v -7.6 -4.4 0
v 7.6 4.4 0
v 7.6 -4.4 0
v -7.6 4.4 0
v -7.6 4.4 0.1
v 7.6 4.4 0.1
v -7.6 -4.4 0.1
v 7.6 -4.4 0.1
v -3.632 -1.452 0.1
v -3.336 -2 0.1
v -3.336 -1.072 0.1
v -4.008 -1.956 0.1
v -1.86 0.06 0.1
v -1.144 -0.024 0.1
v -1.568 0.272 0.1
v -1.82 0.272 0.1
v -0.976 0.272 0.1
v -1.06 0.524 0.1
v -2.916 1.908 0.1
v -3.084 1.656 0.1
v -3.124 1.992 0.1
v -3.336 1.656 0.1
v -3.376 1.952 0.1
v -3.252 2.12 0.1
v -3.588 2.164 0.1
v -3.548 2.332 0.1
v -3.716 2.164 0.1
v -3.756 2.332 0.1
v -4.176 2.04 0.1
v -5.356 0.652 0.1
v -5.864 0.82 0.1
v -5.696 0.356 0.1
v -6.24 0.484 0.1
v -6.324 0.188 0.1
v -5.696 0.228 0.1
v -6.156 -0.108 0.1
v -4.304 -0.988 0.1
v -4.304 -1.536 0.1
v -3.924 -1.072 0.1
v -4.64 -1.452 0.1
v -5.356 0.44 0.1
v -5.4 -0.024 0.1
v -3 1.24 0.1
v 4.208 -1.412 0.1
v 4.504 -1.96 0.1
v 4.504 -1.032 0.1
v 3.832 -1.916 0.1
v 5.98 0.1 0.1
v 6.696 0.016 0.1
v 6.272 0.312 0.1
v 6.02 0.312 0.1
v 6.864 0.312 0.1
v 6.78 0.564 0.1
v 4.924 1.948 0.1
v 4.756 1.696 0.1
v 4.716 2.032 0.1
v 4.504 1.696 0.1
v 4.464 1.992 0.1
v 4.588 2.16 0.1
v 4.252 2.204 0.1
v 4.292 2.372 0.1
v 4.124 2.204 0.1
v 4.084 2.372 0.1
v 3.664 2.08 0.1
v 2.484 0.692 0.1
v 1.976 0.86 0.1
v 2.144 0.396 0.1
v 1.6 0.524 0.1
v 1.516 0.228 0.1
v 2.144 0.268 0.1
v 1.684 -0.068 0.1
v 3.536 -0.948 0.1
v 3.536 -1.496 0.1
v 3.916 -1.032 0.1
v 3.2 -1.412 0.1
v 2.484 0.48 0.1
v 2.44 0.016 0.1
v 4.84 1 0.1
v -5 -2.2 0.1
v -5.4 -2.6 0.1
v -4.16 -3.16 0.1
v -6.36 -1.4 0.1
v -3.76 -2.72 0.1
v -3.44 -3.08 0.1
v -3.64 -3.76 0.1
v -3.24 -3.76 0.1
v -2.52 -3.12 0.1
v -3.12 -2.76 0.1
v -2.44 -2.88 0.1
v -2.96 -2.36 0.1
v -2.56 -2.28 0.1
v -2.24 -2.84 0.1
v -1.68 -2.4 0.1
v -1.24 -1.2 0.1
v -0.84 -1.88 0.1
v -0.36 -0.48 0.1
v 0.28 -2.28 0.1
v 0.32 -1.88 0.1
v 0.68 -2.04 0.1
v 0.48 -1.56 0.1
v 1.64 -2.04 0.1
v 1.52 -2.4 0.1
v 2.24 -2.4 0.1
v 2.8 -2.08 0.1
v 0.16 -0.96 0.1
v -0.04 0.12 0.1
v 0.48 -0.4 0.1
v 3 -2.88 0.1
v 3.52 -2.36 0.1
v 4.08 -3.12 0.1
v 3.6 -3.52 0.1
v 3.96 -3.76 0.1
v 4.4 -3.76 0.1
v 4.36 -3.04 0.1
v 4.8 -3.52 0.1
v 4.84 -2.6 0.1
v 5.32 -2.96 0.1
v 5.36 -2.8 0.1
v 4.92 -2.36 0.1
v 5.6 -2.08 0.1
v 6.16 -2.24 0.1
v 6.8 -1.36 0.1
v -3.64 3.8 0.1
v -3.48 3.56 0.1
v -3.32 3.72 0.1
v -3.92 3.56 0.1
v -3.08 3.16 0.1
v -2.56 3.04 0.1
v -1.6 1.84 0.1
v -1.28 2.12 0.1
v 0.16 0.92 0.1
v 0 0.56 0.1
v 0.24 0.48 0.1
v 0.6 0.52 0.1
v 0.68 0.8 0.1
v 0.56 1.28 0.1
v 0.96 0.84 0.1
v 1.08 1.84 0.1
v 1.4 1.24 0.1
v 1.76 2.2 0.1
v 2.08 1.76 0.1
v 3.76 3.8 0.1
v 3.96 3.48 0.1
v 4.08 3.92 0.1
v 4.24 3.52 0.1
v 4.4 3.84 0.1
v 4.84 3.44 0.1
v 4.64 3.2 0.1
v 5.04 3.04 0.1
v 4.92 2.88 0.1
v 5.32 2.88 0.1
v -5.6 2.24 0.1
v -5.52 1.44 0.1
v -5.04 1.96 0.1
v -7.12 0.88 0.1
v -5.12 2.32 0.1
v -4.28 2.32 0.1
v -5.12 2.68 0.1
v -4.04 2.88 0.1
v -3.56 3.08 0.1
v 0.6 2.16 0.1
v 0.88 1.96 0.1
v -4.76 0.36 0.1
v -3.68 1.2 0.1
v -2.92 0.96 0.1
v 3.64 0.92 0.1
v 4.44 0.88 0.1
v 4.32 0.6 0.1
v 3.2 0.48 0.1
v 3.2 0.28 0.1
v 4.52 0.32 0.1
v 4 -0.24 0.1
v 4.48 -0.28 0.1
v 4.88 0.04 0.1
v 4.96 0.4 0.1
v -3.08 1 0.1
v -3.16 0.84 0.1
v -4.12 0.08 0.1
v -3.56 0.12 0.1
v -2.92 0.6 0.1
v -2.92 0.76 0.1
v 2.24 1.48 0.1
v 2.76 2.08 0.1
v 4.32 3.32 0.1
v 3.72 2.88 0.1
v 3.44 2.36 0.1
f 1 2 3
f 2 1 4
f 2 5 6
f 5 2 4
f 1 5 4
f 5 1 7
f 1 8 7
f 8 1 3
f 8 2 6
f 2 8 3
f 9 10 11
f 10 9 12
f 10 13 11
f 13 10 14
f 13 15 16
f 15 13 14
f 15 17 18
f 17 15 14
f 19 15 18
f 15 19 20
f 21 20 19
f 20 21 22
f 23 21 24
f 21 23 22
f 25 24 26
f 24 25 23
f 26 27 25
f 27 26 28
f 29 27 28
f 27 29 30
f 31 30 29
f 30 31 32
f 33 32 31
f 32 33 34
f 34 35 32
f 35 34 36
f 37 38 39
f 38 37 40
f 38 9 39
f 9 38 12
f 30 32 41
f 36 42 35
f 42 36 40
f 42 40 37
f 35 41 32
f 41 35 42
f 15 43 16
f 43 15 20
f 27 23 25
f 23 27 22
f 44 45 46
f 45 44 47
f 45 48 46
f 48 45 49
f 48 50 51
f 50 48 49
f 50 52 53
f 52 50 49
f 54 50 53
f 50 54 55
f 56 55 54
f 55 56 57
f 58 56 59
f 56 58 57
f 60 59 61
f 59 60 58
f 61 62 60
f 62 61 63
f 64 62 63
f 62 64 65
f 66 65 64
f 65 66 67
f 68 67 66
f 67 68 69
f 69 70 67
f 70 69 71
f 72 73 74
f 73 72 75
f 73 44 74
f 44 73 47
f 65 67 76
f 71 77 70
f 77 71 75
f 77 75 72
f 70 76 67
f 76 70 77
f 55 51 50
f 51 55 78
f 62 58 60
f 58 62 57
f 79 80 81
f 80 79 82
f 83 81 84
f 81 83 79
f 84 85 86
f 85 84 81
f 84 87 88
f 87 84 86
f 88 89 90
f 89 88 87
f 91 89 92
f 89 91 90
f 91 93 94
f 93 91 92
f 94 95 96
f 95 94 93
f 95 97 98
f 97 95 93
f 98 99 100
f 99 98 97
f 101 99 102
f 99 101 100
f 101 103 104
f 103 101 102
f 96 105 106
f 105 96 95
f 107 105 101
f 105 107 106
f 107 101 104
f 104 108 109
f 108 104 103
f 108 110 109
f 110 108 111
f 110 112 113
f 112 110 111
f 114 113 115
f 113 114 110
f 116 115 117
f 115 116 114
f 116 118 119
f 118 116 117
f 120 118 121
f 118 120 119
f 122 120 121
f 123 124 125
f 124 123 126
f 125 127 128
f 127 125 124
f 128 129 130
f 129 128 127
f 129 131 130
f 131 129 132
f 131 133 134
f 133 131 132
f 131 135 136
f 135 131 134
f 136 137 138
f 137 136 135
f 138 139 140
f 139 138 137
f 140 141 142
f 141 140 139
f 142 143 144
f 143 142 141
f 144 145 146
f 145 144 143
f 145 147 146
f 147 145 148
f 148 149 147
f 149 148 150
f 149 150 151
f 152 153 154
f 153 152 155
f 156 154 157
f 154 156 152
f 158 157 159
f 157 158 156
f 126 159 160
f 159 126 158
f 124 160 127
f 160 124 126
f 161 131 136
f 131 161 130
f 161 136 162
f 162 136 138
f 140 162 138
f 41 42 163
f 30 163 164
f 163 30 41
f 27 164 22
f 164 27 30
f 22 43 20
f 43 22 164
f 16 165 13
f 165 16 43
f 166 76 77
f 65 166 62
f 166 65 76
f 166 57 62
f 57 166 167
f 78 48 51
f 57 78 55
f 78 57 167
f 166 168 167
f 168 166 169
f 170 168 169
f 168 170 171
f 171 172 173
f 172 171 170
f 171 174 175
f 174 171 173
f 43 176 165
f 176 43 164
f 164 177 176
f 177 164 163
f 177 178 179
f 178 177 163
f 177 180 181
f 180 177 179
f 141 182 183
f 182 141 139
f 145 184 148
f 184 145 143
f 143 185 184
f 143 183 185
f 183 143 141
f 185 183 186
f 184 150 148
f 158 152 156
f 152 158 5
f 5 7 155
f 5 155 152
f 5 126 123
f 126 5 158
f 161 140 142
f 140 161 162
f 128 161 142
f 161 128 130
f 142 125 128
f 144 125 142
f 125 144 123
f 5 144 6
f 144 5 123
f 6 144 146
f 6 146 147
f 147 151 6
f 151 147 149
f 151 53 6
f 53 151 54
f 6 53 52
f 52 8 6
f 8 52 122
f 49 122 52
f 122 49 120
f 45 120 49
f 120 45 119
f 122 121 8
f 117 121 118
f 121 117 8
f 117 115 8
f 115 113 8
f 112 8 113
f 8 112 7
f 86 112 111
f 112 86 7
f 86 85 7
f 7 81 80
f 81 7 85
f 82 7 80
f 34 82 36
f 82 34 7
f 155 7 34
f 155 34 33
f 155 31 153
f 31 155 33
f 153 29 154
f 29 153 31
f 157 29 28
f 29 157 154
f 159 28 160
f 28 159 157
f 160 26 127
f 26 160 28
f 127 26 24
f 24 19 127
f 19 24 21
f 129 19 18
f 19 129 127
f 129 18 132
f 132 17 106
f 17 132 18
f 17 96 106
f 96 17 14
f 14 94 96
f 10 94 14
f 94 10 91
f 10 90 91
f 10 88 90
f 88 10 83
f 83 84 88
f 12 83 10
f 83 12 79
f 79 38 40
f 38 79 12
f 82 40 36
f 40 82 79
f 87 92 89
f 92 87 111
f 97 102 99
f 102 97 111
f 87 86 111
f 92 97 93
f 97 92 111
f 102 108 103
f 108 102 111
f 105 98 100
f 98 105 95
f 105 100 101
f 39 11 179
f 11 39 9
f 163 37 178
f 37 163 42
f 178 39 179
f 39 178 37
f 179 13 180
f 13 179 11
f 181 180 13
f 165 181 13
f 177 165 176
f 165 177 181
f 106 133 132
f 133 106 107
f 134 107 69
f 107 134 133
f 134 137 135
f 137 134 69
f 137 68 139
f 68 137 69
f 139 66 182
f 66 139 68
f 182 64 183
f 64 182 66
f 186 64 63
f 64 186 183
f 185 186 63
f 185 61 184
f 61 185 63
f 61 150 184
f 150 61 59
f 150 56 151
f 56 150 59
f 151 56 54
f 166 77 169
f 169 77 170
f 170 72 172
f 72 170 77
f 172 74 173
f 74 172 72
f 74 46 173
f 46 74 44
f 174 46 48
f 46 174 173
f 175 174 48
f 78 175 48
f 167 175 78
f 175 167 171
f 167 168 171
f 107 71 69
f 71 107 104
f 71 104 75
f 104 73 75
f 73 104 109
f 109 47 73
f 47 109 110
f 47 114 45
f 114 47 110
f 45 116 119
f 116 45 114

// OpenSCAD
// file: ../p/box5-12.scad
use <../lib.scad>
function ldraw_lib__box5_12() = [
// 0 Box with 5 Faces without Any Edges
// 0 Name: box5-12.dat
// 0 Author: Chris Dee [cwdee]
// 0 !LDRAW_ORG Primitive UPDATE 2009-02
// 0 !LICENSE Licensed under CC BY 2.0 and CC BY 4.0 : see CAreadme.txt
// 
// 0 BFC CERTIFY CCW
  [0,"BFC","CERTIFY"],
  [0,"BFC","CCW"],
// 
// 0 !HISTORY 2009-09-03 [PTadmin] Official Update 2009-02
// 
// 
// 4 16 1 1 1 1 1 -1 -1 1 -1 -1 1 1
  [4,16,1,1,1,1,1,-1,-1,1,-1,-1,1,1],
// 4 16 -1 0 1 1 0 1 1 1 1 -1 1 1
  [4,16,-1,0,1,1,0,1,1,1,1,-1,1,1],
// 4 16 -1 0 -1 -1 0 1 -1 1 1 -1 1 -1
  [4,16,-1,0,-1,-1,0,1,-1,1,1,-1,1,-1],
// 4 16 1 0 -1 -1 0 -1 -1 1 -1 1 1 -1
  [4,16,1,0,-1,-1,0,-1,-1,1,-1,1,1,-1],
// 4 16 1 0 1 1 0 -1 1 1 -1 1 1 1
  [4,16,1,0,1,1,0,-1,1,1,-1,1,1,1],
// 0
];
makepoly(ldraw_lib__box5_12(), line=0.2);
// main file
use <../lib.scad>
use <../p/box5-12.scad>
function ldraw_lib__6005724h1() = [
// 0 Sticker  1.1 x  1.9 with Diamond Bricks Type 1
// 0 Name: 6005724h1.dat
// 0 Author: Christian Neumann [Wesley]
// 0 !LDRAW_ORG Part UPDATE 2014-02
// 0 !LICENSE Licensed under CC BY 2.0 and CC BY 4.0 : see CAreadme.txt
// 
// 0 BFC CERTIFY CCW
  [0,"BFC","CERTIFY"],
  [0,"BFC","CCW"],
// 
// 0 !KEYWORDS Lord of the Rings, LOTR, Mines of Moria, Set 9473
// 
// 0 !CMDLINE -c72
// 
// 0 !HISTORY 2014-12-23 [PTadmin] Official Update 2014-02
// 
// 
// 1 16 0 -0.25 0 19 0 0 0 0.25 0 0 0 11 box5-12.dat
  [1,16,0,-0.25,0,19,0,0,0,0.25,0,0,0,11, ldraw_lib__box5_12()],
// 4 0 -9.08 -0.25 -3.63 -10.02 -0.25 -4.89 -8.34 -0.25 -5 -8.34 -0.25 -2.68
  [4,0,-9.08,-0.25,-3.63,-10.02,-0.25,-4.89,-8.34,-0.25,-5,-8.34,-0.25,-2.68],
// 4 0 -4.65 -0.25 0.15 -8.34 -0.25 -2.68 -8.34 -0.25 -5 -2.86 -0.25 -0.06
  [4,0,-4.65,-0.25,0.15,-8.34,-0.25,-2.68,-8.34,-0.25,-5,-2.86,-0.25,-0.06],
// 4 0 -4.55 -0.25 0.68 -4.65 -0.25 0.15 -2.86 -0.25 -0.06 -3.92 -0.25 0.68
  [4,0,-4.55,-0.25,0.68,-4.65,-0.25,0.15,-2.86,-0.25,-0.06,-3.92,-0.25,0.68],
// 4 0 -3.92 -0.25 0.68 -2.86 -0.25 -0.06 -2.44 -0.25 0.68 -2.65 -0.25 1.31
  [4,0,-3.92,-0.25,0.68,-2.86,-0.25,-0.06,-2.44,-0.25,0.68,-2.65,-0.25,1.31],
// 4 0 -3.92 -0.25 0.68 -2.65 -0.25 1.31 -7.29 -0.25 4.77 -7.71 -0.25 4.14
  [4,0,-3.92,-0.25,0.68,-2.65,-0.25,1.31,-7.29,-0.25,4.77,-7.71,-0.25,4.14],
// 4 0 -7.71 -0.25 4.14 -7.29 -0.25 4.77 -7.81 -0.25 4.98 -8.34 -0.25 4.14
  [4,0,-7.71,-0.25,4.14,-7.29,-0.25,4.77,-7.81,-0.25,4.98,-8.34,-0.25,4.14],
// 4 0 -8.44 -0.25 4.88 -8.34 -0.25 4.14 -7.81 -0.25 4.98 -8.13 -0.25 5.3
  [4,0,-8.44,-0.25,4.88,-8.34,-0.25,4.14,-7.81,-0.25,4.98,-8.13,-0.25,5.3],
// 4 0 -8.97 -0.25 5.41 -8.44 -0.25 4.88 -8.13 -0.25 5.3 -8.87 -0.25 5.83
  [4,0,-8.97,-0.25,5.41,-8.44,-0.25,4.88,-8.13,-0.25,5.3,-8.87,-0.25,5.83],
// 4 0 -8.97 -0.25 5.41 -8.87 -0.25 5.83 -9.39 -0.25 5.83 -9.29 -0.25 5.41
  [4,0,-8.97,-0.25,5.41,-8.87,-0.25,5.83,-9.39,-0.25,5.83,-9.29,-0.25,5.41],
// 4 0 -9.29 -0.25 5.41 -9.39 -0.25 5.83 -10.44 -0.25 5.1 -13.39 -0.25 1.63
  [4,0,-9.29,-0.25,5.41,-9.39,-0.25,5.83,-10.44,-0.25,5.1,-13.39,-0.25,1.63],
// 4 0 -13.39 -0.25 1.63 -10.44 -0.25 5.1 -14.66 -0.25 2.05 -14.24 -0.25 0.89
  [4,0,-13.39,-0.25,1.63,-10.44,-0.25,5.1,-14.66,-0.25,2.05,-14.24,-0.25,0.89],
// 4 0 -14.24 -0.25 0.89 -14.66 -0.25 2.05 -15.6 -0.25 1.21 -15.81 -0.25 0.47
  [4,0,-14.24,-0.25,0.89,-14.66,-0.25,2.05,-15.6,-0.25,1.21,-15.81,-0.25,0.47],
// 4 0 -14.24 -0.25 0.57 -14.24 -0.25 0.89 -15.81 -0.25 0.47 -15.39 -0.25 -0.27
  [4,0,-14.24,-0.25,0.57,-14.24,-0.25,0.89,-15.81,-0.25,0.47,-15.39,-0.25,-0.27],
// 4 0 -10.76 -0.25 -2.47 -11.6 -0.25 -3.63 -10.76 -0.25 -3.84 -9.81 -0.25 -2.68
  [4,0,-10.76,-0.25,-2.47,-11.6,-0.25,-3.63,-10.76,-0.25,-3.84,-9.81,-0.25,-2.68],
// 4 0 -9.81 -0.25 -2.68 -10.76 -0.25 -3.84 -10.02 -0.25 -4.89 -9.08 -0.25 -3.63
  [4,0,-9.81,-0.25,-2.68,-10.76,-0.25,-3.84,-10.02,-0.25,-4.89,-9.08,-0.25,-3.63],
// 3 0 -13.39 -0.25 1.63 -14.24 -0.25 0.89 -13.39 -0.25 1.1
  [3,0,-13.39,-0.25,1.63,-14.24,-0.25,0.89,-13.39,-0.25,1.1],
// 4 0 -13.5 -0.25 -0.06 -14.24 -0.25 0.57 -15.39 -0.25 -0.27 -11.6 -0.25 -3.63
  [4,0,-13.5,-0.25,-0.06,-14.24,-0.25,0.57,-15.39,-0.25,-0.27,-11.6,-0.25,-3.63],
// 3 0 -13.5 -0.25 -0.06 -11.6 -0.25 -3.63 -10.76 -0.25 -2.47
  [3,0,-13.5,-0.25,-0.06,-11.6,-0.25,-3.63,-10.76,-0.25,-2.47],
// 4 28 -14.24 -0.25 0.89 -14.24 -0.25 0.57 -13.5 -0.25 -0.06 -13.39 -0.25 1.1
  [4,28,-14.24,-0.25,0.89,-14.24,-0.25,0.57,-13.5,-0.25,-0.06,-13.39,-0.25,1.1],
// 4 28 -4.55 -0.25 0.68 -3.92 -0.25 0.68 -7.71 -0.25 4.14 -7.5 -0.25 3.1
  [4,28,-4.55,-0.25,0.68,-3.92,-0.25,0.68,-7.71,-0.25,4.14,-7.5,-0.25,3.1],
// 4 28 -9.29 -0.25 5.41 -8.34 -0.25 4.14 -8.44 -0.25 4.88 -8.97 -0.25 5.41
  [4,28,-9.29,-0.25,5.41,-8.34,-0.25,4.14,-8.44,-0.25,4.88,-8.97,-0.25,5.41],
// 4 0 10.52 -0.25 -3.53 9.58 -0.25 -4.79 11.26 -0.25 -4.9 11.26 -0.25 -2.58
  [4,0,10.52,-0.25,-3.53,9.58,-0.25,-4.79,11.26,-0.25,-4.9,11.26,-0.25,-2.58],
// 4 0 14.95 -0.25 0.25 11.26 -0.25 -2.58 11.26 -0.25 -4.9 16.74 -0.25 0.04
  [4,0,14.95,-0.25,0.25,11.26,-0.25,-2.58,11.26,-0.25,-4.9,16.74,-0.25,0.04],
// 4 0 15.05 -0.25 0.78 14.95 -0.25 0.25 16.74 -0.25 0.04 15.68 -0.25 0.78
  [4,0,15.05,-0.25,0.78,14.95,-0.25,0.25,16.74,-0.25,0.04,15.68,-0.25,0.78],
// 4 0 15.68 -0.25 0.78 16.74 -0.25 0.04 17.16 -0.25 0.78 16.95 -0.25 1.41
  [4,0,15.68,-0.25,0.78,16.74,-0.25,0.04,17.16,-0.25,0.78,16.95,-0.25,1.41],
// 4 0 15.68 -0.25 0.78 16.95 -0.25 1.41 12.31 -0.25 4.87 11.89 -0.25 4.24
  [4,0,15.68,-0.25,0.78,16.95,-0.25,1.41,12.31,-0.25,4.87,11.89,-0.25,4.24],
// 4 0 11.89 -0.25 4.24 12.31 -0.25 4.87 11.79 -0.25 5.08 11.26 -0.25 4.24
  [4,0,11.89,-0.25,4.24,12.31,-0.25,4.87,11.79,-0.25,5.08,11.26,-0.25,4.24],
// 4 0 11.16 -0.25 4.98 11.26 -0.25 4.24 11.79 -0.25 5.08 11.47 -0.25 5.4
  [4,0,11.16,-0.25,4.98,11.26,-0.25,4.24,11.79,-0.25,5.08,11.47,-0.25,5.4],
// 4 0 10.63 -0.25 5.51 11.16 -0.25 4.98 11.47 -0.25 5.4 10.73 -0.25 5.93
  [4,0,10.63,-0.25,5.51,11.16,-0.25,4.98,11.47,-0.25,5.4,10.73,-0.25,5.93],
// 4 0 10.63 -0.25 5.51 10.73 -0.25 5.93 10.21 -0.25 5.93 10.31 -0.25 5.51
  [4,0,10.63,-0.25,5.51,10.73,-0.25,5.93,10.21,-0.25,5.93,10.31,-0.25,5.51],
// 4 0 10.31 -0.25 5.51 10.21 -0.25 5.93 9.16 -0.25 5.2 6.21 -0.25 1.73
  [4,0,10.31,-0.25,5.51,10.21,-0.25,5.93,9.16,-0.25,5.2,6.21,-0.25,1.73],
// 4 0 6.21 -0.25 1.73 9.16 -0.25 5.2 4.94 -0.25 2.15 5.36 -0.25 0.99
  [4,0,6.21,-0.25,1.73,9.16,-0.25,5.2,4.94,-0.25,2.15,5.36,-0.25,0.99],
// 4 0 5.36 -0.25 0.99 4.94 -0.25 2.15 4 -0.25 1.31 3.79 -0.25 0.57
  [4,0,5.36,-0.25,0.99,4.94,-0.25,2.15,4,-0.25,1.31,3.79,-0.25,0.57],
// 4 0 5.36 -0.25 0.67 5.36 -0.25 0.99 3.79 -0.25 0.57 4.21 -0.25 -0.17
  [4,0,5.36,-0.25,0.67,5.36,-0.25,0.99,3.79,-0.25,0.57,4.21,-0.25,-0.17],
// 4 0 8.84 -0.25 -2.37 8 -0.25 -3.53 8.84 -0.25 -3.74 9.79 -0.25 -2.58
  [4,0,8.84,-0.25,-2.37,8,-0.25,-3.53,8.84,-0.25,-3.74,9.79,-0.25,-2.58],
// 4 0 9.79 -0.25 -2.58 8.84 -0.25 -3.74 9.58 -0.25 -4.79 10.52 -0.25 -3.53
  [4,0,9.79,-0.25,-2.58,8.84,-0.25,-3.74,9.58,-0.25,-4.79,10.52,-0.25,-3.53],
// 3 0 6.21 -0.25 1.73 5.36 -0.25 0.99 6.21 -0.25 1.2
  [3,0,6.21,-0.25,1.73,5.36,-0.25,0.99,6.21,-0.25,1.2],
// 4 0 6.1 -0.25 0.04 5.36 -0.25 0.67 4.21 -0.25 -0.17 8 -0.25 -3.53
  [4,0,6.1,-0.25,0.04,5.36,-0.25,0.67,4.21,-0.25,-0.17,8,-0.25,-3.53],
// 3 0 6.1 -0.25 0.04 8 -0.25 -3.53 8.84 -0.25 -2.37
  [3,0,6.1,-0.25,0.04,8,-0.25,-3.53,8.84,-0.25,-2.37],
// 4 28 5.36 -0.25 0.99 5.36 -0.25 0.67 6.1 -0.25 0.04 6.21 -0.25 1.2
  [4,28,5.36,-0.25,0.99,5.36,-0.25,0.67,6.1,-0.25,0.04,6.21,-0.25,1.2],
// 4 28 15.05 -0.25 0.78 15.68 -0.25 0.78 11.89 -0.25 4.24 12.1 -0.25 2.5
  [4,28,15.05,-0.25,0.78,15.68,-0.25,0.78,11.89,-0.25,4.24,12.1,-0.25,2.5],
// 4 28 10.31 -0.25 5.51 11.26 -0.25 4.24 11.16 -0.25 4.98 10.63 -0.25 5.51
  [4,28,10.31,-0.25,5.51,11.26,-0.25,4.24,11.16,-0.25,4.98,10.63,-0.25,5.51],
// 4 0 -12.5 -0.25 -5.5 -15.9 -0.25 -3.5 -13.5 -0.25 -6.5 -10.4 -0.25 -7.9
  [4,0,-12.5,-0.25,-5.5,-15.9,-0.25,-3.5,-13.5,-0.25,-6.5,-10.4,-0.25,-7.9],
// 4 0 -9.4 -0.25 -6.8 -12.5 -0.25 -5.5 -10.4 -0.25 -7.9 -8.6 -0.25 -7.7
  [4,0,-9.4,-0.25,-6.8,-12.5,-0.25,-5.5,-10.4,-0.25,-7.9,-8.6,-0.25,-7.7],
// 4 0 -8.6 -0.25 -7.7 -10.4 -0.25 -7.9 -9.1 -0.25 -9.4 -8.1 -0.25 -9.4
  [4,0,-8.6,-0.25,-7.7,-10.4,-0.25,-7.9,-9.1,-0.25,-9.4,-8.1,-0.25,-9.4],
// 4 0 -8.6 -0.25 -7.7 -8.1 -0.25 -9.4 -6.3 -0.25 -7.8 -7.8 -0.25 -6.9
  [4,0,-8.6,-0.25,-7.7,-8.1,-0.25,-9.4,-6.3,-0.25,-7.8,-7.8,-0.25,-6.9],
// 4 0 -7.4 -0.25 -5.9 -7.8 -0.25 -6.9 -6.3 -0.25 -7.8 -6.1 -0.25 -7.2
  [4,0,-7.4,-0.25,-5.9,-7.8,-0.25,-6.9,-6.3,-0.25,-7.8,-6.1,-0.25,-7.2],
// 4 0 -6.4 -0.25 -5.7 -7.4 -0.25 -5.9 -6.1 -0.25 -7.2 -5.6 -0.25 -7.1
  [4,0,-6.4,-0.25,-5.7,-7.4,-0.25,-5.9,-6.1,-0.25,-7.2,-5.6,-0.25,-7.1],
// 4 0 -6.4 -0.25 -5.7 -5.6 -0.25 -7.1 -4.2 -0.25 -6 -3.1 -0.25 -3
  [4,0,-6.4,-0.25,-5.7,-5.6,-0.25,-7.1,-4.2,-0.25,-6,-3.1,-0.25,-3],
// 4 0 -3.1 -0.25 -3 -4.2 -0.25 -6 -2.1 -0.25 -4.7 -0.9 -0.25 -1.2
  [4,0,-3.1,-0.25,-3,-4.2,-0.25,-6,-2.1,-0.25,-4.7,-0.9,-0.25,-1.2],
// 4 0 -2.1 -0.25 -4.7 -4.2 -0.25 -6 0.7 -0.25 -5.7 0.8 -0.25 -4.7
  [4,0,-2.1,-0.25,-4.7,-4.2,-0.25,-6,0.7,-0.25,-5.7,0.8,-0.25,-4.7],
// 4 0 0.8 -0.25 -4.7 0.7 -0.25 -5.7 1.7 -0.25 -5.1 1.2 -0.25 -3.9
  [4,0,0.8,-0.25,-4.7,0.7,-0.25,-5.7,1.7,-0.25,-5.1,1.2,-0.25,-3.9],
// 4 0 4.1 -0.25 -5.1 1.2 -0.25 -3.9 1.7 -0.25 -5.1 3.8 -0.25 -6
  [4,0,4.1,-0.25,-5.1,1.2,-0.25,-3.9,1.7,-0.25,-5.1,3.8,-0.25,-6],
// 4 0 4.1 -0.25 -5.1 3.8 -0.25 -6 5.6 -0.25 -6 7 -0.25 -5.2
  [4,0,4.1,-0.25,-5.1,3.8,-0.25,-6,5.6,-0.25,-6,7,-0.25,-5.2],
// 4 0 -0.9 -0.25 -1.2 -2.1 -0.25 -4.7 0.4 -0.25 -2.4 -0.1 -0.25 0.3
  [4,0,-0.9,-0.25,-1.2,-2.1,-0.25,-4.7,0.4,-0.25,-2.4,-0.1,-0.25,0.3],
// 4 0 1.2 -0.25 -1 -0.1 -0.25 0.3 0.4 -0.25 -2.4 4.1 -0.25 -5.1
  [4,0,1.2,-0.25,-1,-0.1,-0.25,0.3,0.4,-0.25,-2.4,4.1,-0.25,-5.1],
// 3 0 1.2 -0.25 -1 4.1 -0.25 -5.1 7 -0.25 -5.2
  [3,0,1.2,-0.25,-1,4.1,-0.25,-5.1,7,-0.25,-5.2],
// 4 0 7 -0.25 -5.2 5.6 -0.25 -6 7.5 -0.25 -7.2 8.8 -0.25 -5.9
  [4,0,7,-0.25,-5.2,5.6,-0.25,-6,7.5,-0.25,-7.2,8.8,-0.25,-5.9],
// 4 0 8.8 -0.25 -5.9 7.5 -0.25 -7.2 9 -0.25 -8.8 10.2 -0.25 -7.8
  [4,0,8.8,-0.25,-5.9,7.5,-0.25,-7.2,9,-0.25,-8.8,10.2,-0.25,-7.8],
// 4 0 10.2 -0.25 -7.8 9 -0.25 -8.8 9.9 -0.25 -9.4 11 -0.25 -9.4
  [4,0,10.2,-0.25,-7.8,9,-0.25,-8.8,9.9,-0.25,-9.4,11,-0.25,-9.4],
// 4 0 10.2 -0.25 -7.8 11 -0.25 -9.4 12 -0.25 -8.8 10.9 -0.25 -7.6
  [4,0,10.2,-0.25,-7.8,11,-0.25,-9.4,12,-0.25,-8.8,10.9,-0.25,-7.6],
// 4 0 10.9 -0.25 -7.6 12 -0.25 -8.8 13.3 -0.25 -7.4 12.1 -0.25 -6.5
  [4,0,10.9,-0.25,-7.6,12,-0.25,-8.8,13.3,-0.25,-7.4,12.1,-0.25,-6.5],
// 4 0 12.3 -0.25 -5.9 12.1 -0.25 -6.5 13.3 -0.25 -7.4 13.4 -0.25 -7
  [4,0,12.3,-0.25,-5.9,12.1,-0.25,-6.5,13.3,-0.25,-7.4,13.4,-0.25,-7],
// 4 0 14 -0.25 -5.2 12.3 -0.25 -5.9 13.4 -0.25 -7 15.4 -0.25 -5.6
  [4,0,14,-0.25,-5.2,12.3,-0.25,-5.9,13.4,-0.25,-7,15.4,-0.25,-5.6],
// 3 0 17 -0.25 -3.4 14 -0.25 -5.2 15.4 -0.25 -5.6
  [3,0,17,-0.25,-3.4,14,-0.25,-5.2,15.4,-0.25,-5.6],
// 4 0 -9.1 -0.25 9.5 -9.8 -0.25 8.9 -8.7 -0.25 8.9 -8.3 -0.25 9.3
  [4,0,-9.1,-0.25,9.5,-9.8,-0.25,8.9,-8.7,-0.25,8.9,-8.3,-0.25,9.3],
// 4 0 -8.3 -0.25 9.3 -8.7 -0.25 8.9 -7.7 -0.25 7.9 -6.4 -0.25 7.6
  [4,0,-8.3,-0.25,9.3,-8.7,-0.25,8.9,-7.7,-0.25,7.9,-6.4,-0.25,7.6],
// 4 0 -6.4 -0.25 7.6 -7.7 -0.25 7.9 -4 -0.25 4.6 -3.2 -0.25 5.3
  [4,0,-6.4,-0.25,7.6,-7.7,-0.25,7.9,-4,-0.25,4.6,-3.2,-0.25,5.3],
// 4 0 -3.2 -0.25 5.3 -4 -0.25 4.6 0 -0.25 1.4 0.4 -0.25 2.3
  [4,0,-3.2,-0.25,5.3,-4,-0.25,4.6,0,-0.25,1.4,0.4,-0.25,2.3],
// 4 0 0.4 -0.25 2.3 0 -0.25 1.4 0.6 -0.25 1.2 1.5 -0.25 1.3
  [4,0,0.4,-0.25,2.3,0,-0.25,1.4,0.6,-0.25,1.2,1.5,-0.25,1.3],
// 4 0 0.4 -0.25 2.3 1.5 -0.25 1.3 1.7 -0.25 2 1.4 -0.25 3.2
  [4,0,0.4,-0.25,2.3,1.5,-0.25,1.3,1.7,-0.25,2,1.4,-0.25,3.2],
// 4 0 1.4 -0.25 3.2 1.7 -0.25 2 2.4 -0.25 2.1 2.7 -0.25 4.6
  [4,0,1.4,-0.25,3.2,1.7,-0.25,2,2.4,-0.25,2.1,2.7,-0.25,4.6],
// 4 0 2.7 -0.25 4.6 2.4 -0.25 2.1 3.5 -0.25 3.1 4.4 -0.25 5.5
  [4,0,2.7,-0.25,4.6,2.4,-0.25,2.1,3.5,-0.25,3.1,4.4,-0.25,5.5],
// 4 0 4.4 -0.25 5.5 3.5 -0.25 3.1 5.2 -0.25 4.4 9.4 -0.25 9.5
  [4,0,4.4,-0.25,5.5,3.5,-0.25,3.1,5.2,-0.25,4.4,9.4,-0.25,9.5],
// 4 0 9.4 -0.25 9.5 5.2 -0.25 4.4 9.9 -0.25 8.7 10.2 -0.25 9.8
  [4,0,9.4,-0.25,9.5,5.2,-0.25,4.4,9.9,-0.25,8.7,10.2,-0.25,9.8],
// 4 0 10.2 -0.25 9.8 9.9 -0.25 8.7 10.6 -0.25 8.8 11 -0.25 9.6
  [4,0,10.2,-0.25,9.8,9.9,-0.25,8.7,10.6,-0.25,8.8,11,-0.25,9.6],
// 4 0 11 -0.25 9.6 10.6 -0.25 8.8 11.6 -0.25 8 12.1 -0.25 8.6
  [4,0,11,-0.25,9.6,10.6,-0.25,8.8,11.6,-0.25,8,12.1,-0.25,8.6],
// 4 0 12.1 -0.25 8.6 11.6 -0.25 8 12.3 -0.25 7.2 12.6 -0.25 7.6
  [4,0,12.1,-0.25,8.6,11.6,-0.25,8,12.3,-0.25,7.2,12.6,-0.25,7.6],
// 3 0 12.6 -0.25 7.6 12.3 -0.25 7.2 13.3 -0.25 7.2
  [3,0,12.6,-0.25,7.6,12.3,-0.25,7.2,13.3,-0.25,7.2],
// 4 28 -14 -0.25 5.6 -17.8 -0.25 2.2 -13.8 -0.25 3.6 -12.6 -0.25 4.9
  [4,28,-14,-0.25,5.6,-17.8,-0.25,2.2,-13.8,-0.25,3.6,-12.6,-0.25,4.9],
// 4 28 -12.8 -0.25 5.8 -14 -0.25 5.6 -12.6 -0.25 4.9 -10.7 -0.25 5.8
  [4,28,-12.8,-0.25,5.8,-14,-0.25,5.6,-12.6,-0.25,4.9,-10.7,-0.25,5.8],
// 4 28 -12.8 -0.25 6.7 -12.8 -0.25 5.8 -10.7 -0.25 5.8 -10.1 -0.25 7.2
  [4,28,-12.8,-0.25,6.7,-12.8,-0.25,5.8,-10.7,-0.25,5.8,-10.1,-0.25,7.2],
// 4 28 -9.8 -0.25 8.9 -12.8 -0.25 6.7 -10.1 -0.25 7.2 -8.9 -0.25 7.7
  [4,28,-9.8,-0.25,8.9,-12.8,-0.25,6.7,-10.1,-0.25,7.2,-8.9,-0.25,7.7],
// 4 28 -8.7 -0.25 8.9 -9.8 -0.25 8.9 -8.9 -0.25 7.7 -7.7 -0.25 7.9
  [4,28,-8.7,-0.25,8.9,-9.8,-0.25,8.9,-8.9,-0.25,7.7,-7.7,-0.25,7.9],
// 4 28 1.4 -0.25 3.2 1.5 -0.25 5.4 -3.2 -0.25 5.3 0.4 -0.25 2.3
  [4,28,1.4,-0.25,3.2,1.5,-0.25,5.4,-3.2,-0.25,5.3,0.4,-0.25,2.3],
// 3 28 1.5 -0.25 5.4 1.4 -0.25 3.2 2.2 -0.25 4.9
  [3,28,1.5,-0.25,5.4,1.4,-0.25,3.2,2.2,-0.25,4.9],
// 3 28 2.2 -0.25 4.9 1.4 -0.25 3.2 2.7 -0.25 4.6
  [3,28,2.2,-0.25,4.9,1.4,-0.25,3.2,2.7,-0.25,4.6],
// 3 28 4.4 -0.25 5.5 2.2 -0.25 4.9 2.7 -0.25 4.6
  [3,28,4.4,-0.25,5.5,2.2,-0.25,4.9,2.7,-0.25,4.6],
// 3 28 -13.39 -0.25 1.1 -13.5 -0.25 -0.06 -11.9 -0.25 0.9
  [3,28,-13.39,-0.25,1.1,-13.5,-0.25,-0.06,-11.9,-0.25,0.9],
// 4 28 -13.39 -0.25 1.63 -13.39 -0.25 1.1 -11.9 -0.25 0.9 -9.2 -0.25 3
  [4,28,-13.39,-0.25,1.63,-13.39,-0.25,1.1,-11.9,-0.25,0.9,-9.2,-0.25,3],
// 4 28 -9.29 -0.25 5.41 -13.39 -0.25 1.63 -9.2 -0.25 3 -8.34 -0.25 4.14
  [4,28,-9.29,-0.25,5.41,-13.39,-0.25,1.63,-9.2,-0.25,3,-8.34,-0.25,4.14],
// 4 28 -8.34 -0.25 4.14 -9.2 -0.25 3 -7.5 -0.25 3.1 -7.71 -0.25 4.14
  [4,28,-8.34,-0.25,4.14,-9.2,-0.25,3,-7.5,-0.25,3.1,-7.71,-0.25,4.14],
// 4 28 -4.55 -0.25 0.68 -7.5 -0.25 3.1 -7.3 -0.25 2.4 -4.65 -0.25 0.15
  [4,28,-4.55,-0.25,0.68,-7.5,-0.25,3.1,-7.3,-0.25,2.4,-4.65,-0.25,0.15],
// 3 28 9.1 -0.25 2.3 6.21 -0.25 1.2 6.1 -0.25 0.04
  [3,28,9.1,-0.25,2.3,6.21,-0.25,1.2,6.1,-0.25,0.04],
// 4 28 6.21 -0.25 1.73 6.21 -0.25 1.2 9.1 -0.25 2.3 10.31 -0.25 5.51
  [4,28,6.21,-0.25,1.73,6.21,-0.25,1.2,9.1,-0.25,2.3,10.31,-0.25,5.51],
// 4 28 11.26 -0.25 4.24 10.31 -0.25 5.51 9.1 -0.25 2.3 11.1 -0.25 2.2
  [4,28,11.26,-0.25,4.24,10.31,-0.25,5.51,9.1,-0.25,2.3,11.1,-0.25,2.2],
// 3 28 12.1 -0.25 2.5 14.95 -0.25 0.25 15.05 -0.25 0.78
  [3,28,12.1,-0.25,2.5,14.95,-0.25,0.25,15.05,-0.25,0.78],
// 4 28 12.1 -0.25 2.5 11.89 -0.25 4.24 11.26 -0.25 4.24 11.1 -0.25 2.2
  [4,28,12.1,-0.25,2.5,11.89,-0.25,4.24,11.26,-0.25,4.24,11.1,-0.25,2.2],
// 4 28 10.8 -0.25 1.5 11.1 -0.25 2.2 9.1 -0.25 2.3 8 -0.25 1.2
  [4,28,10.8,-0.25,1.5,11.1,-0.25,2.2,9.1,-0.25,2.3,8,-0.25,1.2],
// 4 28 10.8 -0.25 1.5 8 -0.25 1.2 8 -0.25 0.7 11.3 -0.25 0.8
  [4,28,10.8,-0.25,1.5,8,-0.25,1.2,8,-0.25,0.7,11.3,-0.25,0.8],
// 4 28 11.3 -0.25 0.8 8 -0.25 0.7 10 -0.25 -0.6 11.2 -0.25 -0.7
  [4,28,11.3,-0.25,0.8,8,-0.25,0.7,10,-0.25,-0.6,11.2,-0.25,-0.7],
// 4 28 11.3 -0.25 0.8 11.2 -0.25 -0.7 12.2 -0.25 0.1 12.4 -0.25 1
  [4,28,11.3,-0.25,0.8,11.2,-0.25,-0.7,12.2,-0.25,0.1,12.4,-0.25,1],
// 4 15 -7.7 -0.25 2.5 -7.3 -0.25 2.4 -7.5 -0.25 3.1 -9.2 -0.25 3
  [4,15,-7.7,-0.25,2.5,-7.3,-0.25,2.4,-7.5,-0.25,3.1,-9.2,-0.25,3],
// 4 15 -7.9 -0.25 2.1 -7.7 -0.25 2.5 -9.2 -0.25 3 -11.9 -0.25 0.9
  [4,15,-7.9,-0.25,2.1,-7.7,-0.25,2.5,-9.2,-0.25,3,-11.9,-0.25,0.9],
// 4 15 -7.9 -0.25 2.1 -11.9 -0.25 0.9 -10.3 -0.25 0.2 -8.9 -0.25 0.3
  [4,15,-7.9,-0.25,2.1,-11.9,-0.25,0.9,-10.3,-0.25,0.2,-8.9,-0.25,0.3],
// 4 15 -7.9 -0.25 2.1 -8.9 -0.25 0.3 -7.3 -0.25 1.5 -7.3 -0.25 1.9
  [4,15,-7.9,-0.25,2.1,-8.9,-0.25,0.3,-7.3,-0.25,1.5,-7.3,-0.25,1.9],
// 4 15 5.2 -0.25 4.4 3.5 -0.25 3.1 5.6 -0.25 3.7 6.9 -0.25 5.2
  [4,15,5.2,-0.25,4.4,3.5,-0.25,3.1,5.6,-0.25,3.7,6.9,-0.25,5.2],
// 4 15 10.8 -0.25 8.3 11.6 -0.25 8 10.6 -0.25 8.8 9.9 -0.25 8.7
  [4,15,10.8,-0.25,8.3,11.6,-0.25,8,10.6,-0.25,8.8,9.9,-0.25,8.7],
// 3 15 9.9 -0.25 8.7 9.3 -0.25 7.2 10.8 -0.25 8.3
  [3,15,9.9,-0.25,8.7,9.3,-0.25,7.2,10.8,-0.25,8.3],
// 4 15 6.9 -0.25 5.2 9.3 -0.25 7.2 9.9 -0.25 8.7 5.2 -0.25 4.4
  [4,15,6.9,-0.25,5.2,9.3,-0.25,7.2,9.9,-0.25,8.7,5.2,-0.25,4.4],
// 3 15 9.3 -0.25 7.2 6.9 -0.25 5.2 8.6 -0.25 5.9
  [3,15,9.3,-0.25,7.2,6.9,-0.25,5.2,8.6,-0.25,5.9],
// 3 15 10.8 -0.25 8.3 12.3 -0.25 7.2 11.6 -0.25 8
  [3,15,10.8,-0.25,8.3,12.3,-0.25,7.2,11.6,-0.25,8],
// 4 16 -14 -0.25 5.6 -12.8 -0.25 5.8 -12.8 -0.25 6.7 -19 -0.25 11
  [4,16,-14,-0.25,5.6,-12.8,-0.25,5.8,-12.8,-0.25,6.7,-19,-0.25,11],
// 3 16 -19 -0.25 11 -19 -0.25 -11 -17.8 -0.25 2.2
  [3,16,-19,-0.25,11,-19,-0.25,-11,-17.8,-0.25,2.2],
// 3 16 -19 -0.25 11 -17.8 -0.25 2.2 -14 -0.25 5.6
  [3,16,-19,-0.25,11,-17.8,-0.25,2.2,-14,-0.25,5.6],
// 4 16 -19 -0.25 11 -12.8 -0.25 6.7 -9.8 -0.25 8.9 -9.1 -0.25 9.5
  [4,16,-19,-0.25,11,-12.8,-0.25,6.7,-9.8,-0.25,8.9,-9.1,-0.25,9.5],
// 4 16 1.5 -0.25 5.4 2.2 -0.25 4.9 4.4 -0.25 5.5 9.4 -0.25 9.5
  [4,16,1.5,-0.25,5.4,2.2,-0.25,4.9,4.4,-0.25,5.5,9.4,-0.25,9.5],
// 4 16 -3.2 -0.25 5.3 1.5 -0.25 5.4 9.4 -0.25 9.5 -6.4 -0.25 7.6
  [4,16,-3.2,-0.25,5.3,1.5,-0.25,5.4,9.4,-0.25,9.5,-6.4,-0.25,7.6],
// 3 16 9.4 -0.25 9.5 -8.3 -0.25 9.3 -6.4 -0.25 7.6
  [3,16,9.4,-0.25,9.5,-8.3,-0.25,9.3,-6.4,-0.25,7.6],
// 4 16 -9.1 -0.25 9.5 -8.3 -0.25 9.3 9.4 -0.25 9.5 10.2 -0.25 9.8
  [4,16,-9.1,-0.25,9.5,-8.3,-0.25,9.3,9.4,-0.25,9.5,10.2,-0.25,9.8],
// 4 16 -9.1 -0.25 9.5 10.2 -0.25 9.8 19 -0.25 11 -19 -0.25 11
  [4,16,-9.1,-0.25,9.5,10.2,-0.25,9.8,19,-0.25,11,-19,-0.25,11],
// 3 16 19 -0.25 11 10.2 -0.25 9.8 11 -0.25 9.6
  [3,16,19,-0.25,11,10.2,-0.25,9.8,11,-0.25,9.6],
// 3 16 19 -0.25 11 11 -0.25 9.6 12.1 -0.25 8.6
  [3,16,19,-0.25,11,11,-0.25,9.6,12.1,-0.25,8.6],
// 4 16 19 -0.25 11 12.1 -0.25 8.6 12.6 -0.25 7.6 13.3 -0.25 7.2
  [4,16,19,-0.25,11,12.1,-0.25,8.6,12.6,-0.25,7.6,13.3,-0.25,7.2],
// 4 16 16.95 -0.25 1.41 19 -0.25 11 13.3 -0.25 7.2 12.31 -0.25 4.87
  [4,16,16.95,-0.25,1.41,19,-0.25,11,13.3,-0.25,7.2,12.31,-0.25,4.87],
// 3 16 19 -0.25 11 16.95 -0.25 1.41 17.16 -0.25 0.78
  [3,16,19,-0.25,11,16.95,-0.25,1.41,17.16,-0.25,0.78],
// 4 16 19 -0.25 -11 19 -0.25 11 17.16 -0.25 0.78 17 -0.25 -3.4
  [4,16,19,-0.25,-11,19,-0.25,11,17.16,-0.25,0.78,17,-0.25,-3.4],
// 4 16 17 -0.25 -3.4 17.16 -0.25 0.78 16.74 -0.25 0.04 14 -0.25 -5.2
  [4,16,17,-0.25,-3.4,17.16,-0.25,0.78,16.74,-0.25,0.04,14,-0.25,-5.2],
// 4 16 14 -0.25 -5.2 16.74 -0.25 0.04 11.26 -0.25 -4.9 12.3 -0.25 -5.9
  [4,16,14,-0.25,-5.2,16.74,-0.25,0.04,11.26,-0.25,-4.9,12.3,-0.25,-5.9],
// 3 16 17 -0.25 -3.4 15.4 -0.25 -5.6 19 -0.25 -11
  [3,16,17,-0.25,-3.4,15.4,-0.25,-5.6,19,-0.25,-11],
// 4 16 19 -0.25 -11 15.4 -0.25 -5.6 13.4 -0.25 -7 13.3 -0.25 -7.4
  [4,16,19,-0.25,-11,15.4,-0.25,-5.6,13.4,-0.25,-7,13.3,-0.25,-7.4],
// 3 16 13.3 -0.25 -7.4 12 -0.25 -8.8 19 -0.25 -11
  [3,16,13.3,-0.25,-7.4,12,-0.25,-8.8,19,-0.25,-11],
// 3 16 12 -0.25 -8.8 11 -0.25 -9.4 19 -0.25 -11
  [3,16,12,-0.25,-8.8,11,-0.25,-9.4,19,-0.25,-11],
// 4 16 19 -0.25 -11 11 -0.25 -9.4 9.9 -0.25 -9.4 -19 -0.25 -11
  [4,16,19,-0.25,-11,11,-0.25,-9.4,9.9,-0.25,-9.4,-19,-0.25,-11],
// 4 16 -8.1 -0.25 -9.4 -19 -0.25 -11 9.9 -0.25 -9.4 9 -0.25 -8.8
  [4,16,-8.1,-0.25,-9.4,-19,-0.25,-11,9.9,-0.25,-9.4,9,-0.25,-8.8],
// 3 16 -8.1 -0.25 -9.4 -9.1 -0.25 -9.4 -19 -0.25 -11
  [3,16,-8.1,-0.25,-9.4,-9.1,-0.25,-9.4,-19,-0.25,-11],
// 4 16 -19 -0.25 -11 -9.1 -0.25 -9.4 -10.4 -0.25 -7.9 -13.5 -0.25 -6.5
  [4,16,-19,-0.25,-11,-9.1,-0.25,-9.4,-10.4,-0.25,-7.9,-13.5,-0.25,-6.5],
// 3 16 -15.9 -0.25 -3.5 -19 -0.25 -11 -13.5 -0.25 -6.5
  [3,16,-15.9,-0.25,-3.5,-19,-0.25,-11,-13.5,-0.25,-6.5],
// 4 16 -19 -0.25 -11 -15.9 -0.25 -3.5 -15.39 -0.25 -0.27 -15.81 -0.25 0.47
  [4,16,-19,-0.25,-11,-15.9,-0.25,-3.5,-15.39,-0.25,-0.27,-15.81,-0.25,0.47],
// 3 16 -17.8 -0.25 2.2 -19 -0.25 -11 -15.81 -0.25 0.47
  [3,16,-17.8,-0.25,2.2,-19,-0.25,-11,-15.81,-0.25,0.47],
// 3 16 -17.8 -0.25 2.2 -15.81 -0.25 0.47 -15.6 -0.25 1.21
  [3,16,-17.8,-0.25,2.2,-15.81,-0.25,0.47,-15.6,-0.25,1.21],
// 4 16 -17.8 -0.25 2.2 -15.6 -0.25 1.21 -14.66 -0.25 2.05 -13.8 -0.25 3.6
  [4,16,-17.8,-0.25,2.2,-15.6,-0.25,1.21,-14.66,-0.25,2.05,-13.8,-0.25,3.6],
// 4 16 -13.8 -0.25 3.6 -14.66 -0.25 2.05 -10.44 -0.25 5.1 -12.6 -0.25 4.9
  [4,16,-13.8,-0.25,3.6,-14.66,-0.25,2.05,-10.44,-0.25,5.1,-12.6,-0.25,4.9],
// 4 16 -10.7 -0.25 5.8 -12.6 -0.25 4.9 -10.44 -0.25 5.1 -9.39 -0.25 5.83
  [4,16,-10.7,-0.25,5.8,-12.6,-0.25,4.9,-10.44,-0.25,5.1,-9.39,-0.25,5.83],
// 4 16 -10.1 -0.25 7.2 -10.7 -0.25 5.8 -9.39 -0.25 5.83 -8.9 -0.25 7.7
  [4,16,-10.1,-0.25,7.2,-10.7,-0.25,5.8,-9.39,-0.25,5.83,-8.9,-0.25,7.7],
// 4 16 -8.9 -0.25 7.7 -9.39 -0.25 5.83 -8.87 -0.25 5.83 -7.7 -0.25 7.9
  [4,16,-8.9,-0.25,7.7,-9.39,-0.25,5.83,-8.87,-0.25,5.83,-7.7,-0.25,7.9],
// 3 16 -7.7 -0.25 7.9 -8.87 -0.25 5.83 -8.13 -0.25 5.3
  [3,16,-7.7,-0.25,7.9,-8.87,-0.25,5.83,-8.13,-0.25,5.3],
// 4 16 -7.7 -0.25 7.9 -8.13 -0.25 5.3 -7.81 -0.25 4.98 -7.29 -0.25 4.77
  [4,16,-7.7,-0.25,7.9,-8.13,-0.25,5.3,-7.81,-0.25,4.98,-7.29,-0.25,4.77],
// 4 16 -4 -0.25 4.6 -7.7 -0.25 7.9 -7.29 -0.25 4.77 -2.65 -0.25 1.31
  [4,16,-4,-0.25,4.6,-7.7,-0.25,7.9,-7.29,-0.25,4.77,-2.65,-0.25,1.31],
// 3 16 -4 -0.25 4.6 -2.65 -0.25 1.31 0 -0.25 1.4
  [3,16,-4,-0.25,4.6,-2.65,-0.25,1.31,0,-0.25,1.4],
// 4 16 0 -0.25 1.4 -2.65 -0.25 1.31 -2.44 -0.25 0.68 -0.1 -0.25 0.3
  [4,16,0,-0.25,1.4,-2.65,-0.25,1.31,-2.44,-0.25,0.68,-0.1,-0.25,0.3],
// 4 16 -0.1 -0.25 0.3 -2.44 -0.25 0.68 -2.86 -0.25 -0.06 -0.9 -0.25 -1.2
  [4,16,-0.1,-0.25,0.3,-2.44,-0.25,0.68,-2.86,-0.25,-0.06,-0.9,-0.25,-1.2],
// 3 16 -2.86 -0.25 -0.06 -3.1 -0.25 -3 -0.9 -0.25 -1.2
  [3,16,-2.86,-0.25,-0.06,-3.1,-0.25,-3,-0.9,-0.25,-1.2],
// 4 16 -6.4 -0.25 -5.7 -3.1 -0.25 -3 -2.86 -0.25 -0.06 -8.34 -0.25 -5
  [4,16,-6.4,-0.25,-5.7,-3.1,-0.25,-3,-2.86,-0.25,-0.06,-8.34,-0.25,-5],
// 3 16 -8.34 -0.25 -5 -7.4 -0.25 -5.9 -6.4 -0.25 -5.7
  [3,16,-8.34,-0.25,-5,-7.4,-0.25,-5.9,-6.4,-0.25,-5.7],
// 4 16 -7.8 -0.25 -6.9 -7.4 -0.25 -5.9 -8.34 -0.25 -5 -9.4 -0.25 -6.8
  [4,16,-7.8,-0.25,-6.9,-7.4,-0.25,-5.9,-8.34,-0.25,-5,-9.4,-0.25,-6.8],
// 3 16 -9.4 -0.25 -6.8 -8.6 -0.25 -7.7 -7.8 -0.25 -6.9
  [3,16,-9.4,-0.25,-6.8,-8.6,-0.25,-7.7,-7.8,-0.25,-6.9],
// 4 16 -9.4 -0.25 -6.8 -8.34 -0.25 -5 -10.02 -0.25 -4.89 -12.5 -0.25 -5.5
  [4,16,-9.4,-0.25,-6.8,-8.34,-0.25,-5,-10.02,-0.25,-4.89,-12.5,-0.25,-5.5],
// 4 16 -12.5 -0.25 -5.5 -10.02 -0.25 -4.89 -10.76 -0.25 -3.84 -11.6 -0.25 -3.63
  [4,16,-12.5,-0.25,-5.5,-10.02,-0.25,-4.89,-10.76,-0.25,-3.84,-11.6,-0.25,-3.63],
// 4 16 -15.9 -0.25 -3.5 -12.5 -0.25 -5.5 -11.6 -0.25 -3.63 -15.39 -0.25 -0.27
  [4,16,-15.9,-0.25,-3.5,-12.5,-0.25,-5.5,-11.6,-0.25,-3.63,-15.39,-0.25,-0.27],
// 4 16 -5.6 -0.25 -7.1 -6.1 -0.25 -7.2 -6.3 -0.25 -7.8 9 -0.25 -8.8
  [4,16,-5.6,-0.25,-7.1,-6.1,-0.25,-7.2,-6.3,-0.25,-7.8,9,-0.25,-8.8],
// 4 16 3.8 -0.25 -6 1.7 -0.25 -5.1 0.7 -0.25 -5.7 9 -0.25 -8.8
  [4,16,3.8,-0.25,-6,1.7,-0.25,-5.1,0.7,-0.25,-5.7,9,-0.25,-8.8],
// 3 16 -6.3 -0.25 -7.8 -8.1 -0.25 -9.4 9 -0.25 -8.8
  [3,16,-6.3,-0.25,-7.8,-8.1,-0.25,-9.4,9,-0.25,-8.8],
// 4 16 -5.6 -0.25 -7.1 9 -0.25 -8.8 0.7 -0.25 -5.7 -4.2 -0.25 -6
  [4,16,-5.6,-0.25,-7.1,9,-0.25,-8.8,0.7,-0.25,-5.7,-4.2,-0.25,-6],
// 4 16 3.8 -0.25 -6 9 -0.25 -8.8 7.5 -0.25 -7.2 5.6 -0.25 -6
  [4,16,3.8,-0.25,-6,9,-0.25,-8.8,7.5,-0.25,-7.2,5.6,-0.25,-6],
// 4 16 -2.1 -0.25 -4.7 0.8 -0.25 -4.7 1.2 -0.25 -3.9 0.4 -0.25 -2.4
  [4,16,-2.1,-0.25,-4.7,0.8,-0.25,-4.7,1.2,-0.25,-3.9,0.4,-0.25,-2.4],
// 3 16 0.4 -0.25 -2.4 1.2 -0.25 -3.9 4.1 -0.25 -5.1
  [3,16,0.4,-0.25,-2.4,1.2,-0.25,-3.9,4.1,-0.25,-5.1],
// 4 16 -9.81 -0.25 -2.68 -9.08 -0.25 -3.63 -8.34 -0.25 -2.68 -8.9 -0.25 0.3
  [4,16,-9.81,-0.25,-2.68,-9.08,-0.25,-3.63,-8.34,-0.25,-2.68,-8.9,-0.25,0.3],
// 4 16 -10.3 -0.25 0.2 -11.9 -0.25 0.9 -13.5 -0.25 -0.06 -10.76 -0.25 -2.47
  [4,16,-10.3,-0.25,0.2,-11.9,-0.25,0.9,-13.5,-0.25,-0.06,-10.76,-0.25,-2.47],
// 4 16 -10.3 -0.25 0.2 -10.76 -0.25 -2.47 -9.81 -0.25 -2.68 -8.9 -0.25 0.3
  [4,16,-10.3,-0.25,0.2,-10.76,-0.25,-2.47,-9.81,-0.25,-2.68,-8.9,-0.25,0.3],
// 4 16 -8.9 -0.25 0.3 -8.34 -0.25 -2.68 -4.65 -0.25 0.15 -7.3 -0.25 1.5
  [4,16,-8.9,-0.25,0.3,-8.34,-0.25,-2.68,-4.65,-0.25,0.15,-7.3,-0.25,1.5],
// 3 16 -7.3 -0.25 1.9 -7.3 -0.25 1.5 -4.65 -0.25 0.15
  [3,16,-7.3,-0.25,1.9,-7.3,-0.25,1.5,-4.65,-0.25,0.15],
// 3 16 -7.3 -0.25 2.4 -7.3 -0.25 1.9 -4.65 -0.25 0.15
  [3,16,-7.3,-0.25,2.4,-7.3,-0.25,1.9,-4.65,-0.25,0.15],
// 4 16 -7.9 -0.25 2.1 -7.3 -0.25 1.9 -7.3 -0.25 2.4 -7.7 -0.25 2.5
  [4,16,-7.9,-0.25,2.1,-7.3,-0.25,1.9,-7.3,-0.25,2.4,-7.7,-0.25,2.5],
// 4 16 0.6 -0.25 1.2 0 -0.25 1.4 -0.1 -0.25 0.3 1.2 -0.25 -1
  [4,16,0.6,-0.25,1.2,0,-0.25,1.4,-0.1,-0.25,0.3,1.2,-0.25,-1],
// 4 16 1.5 -0.25 1.3 0.6 -0.25 1.2 1.2 -0.25 -1 3.79 -0.25 0.57
  [4,16,1.5,-0.25,1.3,0.6,-0.25,1.2,1.2,-0.25,-1,3.79,-0.25,0.57],
// 4 16 1.5 -0.25 1.3 3.79 -0.25 0.57 2.4 -0.25 2.1 1.7 -0.25 2
  [4,16,1.5,-0.25,1.3,3.79,-0.25,0.57,2.4,-0.25,2.1,1.7,-0.25,2],
// 4 16 2.4 -0.25 2.1 3.79 -0.25 0.57 4 -0.25 1.31 3.5 -0.25 3.1
  [4,16,2.4,-0.25,2.1,3.79,-0.25,0.57,4,-0.25,1.31,3.5,-0.25,3.1],
// 4 16 3.5 -0.25 3.1 4 -0.25 1.31 4.94 -0.25 2.15 5.6 -0.25 3.7
  [4,16,3.5,-0.25,3.1,4,-0.25,1.31,4.94,-0.25,2.15,5.6,-0.25,3.7],
// 4 16 5.6 -0.25 3.7 4.94 -0.25 2.15 9.16 -0.25 5.2 6.9 -0.25 5.2
  [4,16,5.6,-0.25,3.7,4.94,-0.25,2.15,9.16,-0.25,5.2,6.9,-0.25,5.2],
// 4 16 8.6 -0.25 5.9 6.9 -0.25 5.2 9.16 -0.25 5.2 10.21 -0.25 5.93
  [4,16,8.6,-0.25,5.9,6.9,-0.25,5.2,9.16,-0.25,5.2,10.21,-0.25,5.93],
// 3 16 9.3 -0.25 7.2 8.6 -0.25 5.9 10.21 -0.25 5.93
  [3,16,9.3,-0.25,7.2,8.6,-0.25,5.9,10.21,-0.25,5.93],
// 4 16 9.3 -0.25 7.2 10.21 -0.25 5.93 10.73 -0.25 5.93 10.8 -0.25 8.3
  [4,16,9.3,-0.25,7.2,10.21,-0.25,5.93,10.73,-0.25,5.93,10.8,-0.25,8.3],
// 4 16 12.3 -0.25 7.2 10.8 -0.25 8.3 10.73 -0.25 5.93 11.47 -0.25 5.4
  [4,16,12.3,-0.25,7.2,10.8,-0.25,8.3,10.73,-0.25,5.93,11.47,-0.25,5.4],
// 4 16 12.3 -0.25 7.2 11.47 -0.25 5.4 11.79 -0.25 5.08 13.3 -0.25 7.2
  [4,16,12.3,-0.25,7.2,11.47,-0.25,5.4,11.79,-0.25,5.08,13.3,-0.25,7.2],
// 3 16 13.3 -0.25 7.2 11.79 -0.25 5.08 12.31 -0.25 4.87
  [3,16,13.3,-0.25,7.2,11.79,-0.25,5.08,12.31,-0.25,4.87],
// 3 16 9.1 -0.25 2.3 6.1 -0.25 0.04 8 -0.25 1.2
  [3,16,9.1,-0.25,2.3,6.1,-0.25,0.04,8,-0.25,1.2],
// 3 16 8 -0.25 1.2 6.1 -0.25 0.04 8 -0.25 0.7
  [3,16,8,-0.25,1.2,6.1,-0.25,0.04,8,-0.25,0.7],
// 4 16 8 -0.25 0.7 6.1 -0.25 0.04 8.84 -0.25 -2.37 10 -0.25 -0.6
  [4,16,8,-0.25,0.7,6.1,-0.25,0.04,8.84,-0.25,-2.37,10,-0.25,-0.6],
// 4 16 10 -0.25 -0.6 8.84 -0.25 -2.37 9.79 -0.25 -2.58 11.2 -0.25 -0.7
  [4,16,10,-0.25,-0.6,8.84,-0.25,-2.37,9.79,-0.25,-2.58,11.2,-0.25,-0.7],
// 4 16 11.26 -0.25 -2.58 11.2 -0.25 -0.7 9.79 -0.25 -2.58 10.52 -0.25 -3.53
  [4,16,11.26,-0.25,-2.58,11.2,-0.25,-0.7,9.79,-0.25,-2.58,10.52,-0.25,-3.53],
// 4 16 12.2 -0.25 0.1 11.2 -0.25 -0.7 11.26 -0.25 -2.58 14.95 -0.25 0.25
  [4,16,12.2,-0.25,0.1,11.2,-0.25,-0.7,11.26,-0.25,-2.58,14.95,-0.25,0.25],
// 3 16 12.4 -0.25 1 12.2 -0.25 0.1 14.95 -0.25 0.25
  [3,16,12.4,-0.25,1,12.2,-0.25,0.1,14.95,-0.25,0.25],
// 3 16 12.1 -0.25 2.5 12.4 -0.25 1 14.95 -0.25 0.25
  [3,16,12.1,-0.25,2.5,12.4,-0.25,1,14.95,-0.25,0.25],
// 4 16 11.3 -0.25 0.8 12.4 -0.25 1 12.1 -0.25 2.5 11.1 -0.25 2.2
  [4,16,11.3,-0.25,0.8,12.4,-0.25,1,12.1,-0.25,2.5,11.1,-0.25,2.2],
// 3 16 11.1 -0.25 2.2 10.8 -0.25 1.5 11.3 -0.25 0.8
  [3,16,11.1,-0.25,2.2,10.8,-0.25,1.5,11.3,-0.25,0.8],
// 4 16 4.21 -0.25 -0.17 3.79 -0.25 0.57 1.2 -0.25 -1 7 -0.25 -5.2
  [4,16,4.21,-0.25,-0.17,3.79,-0.25,0.57,1.2,-0.25,-1,7,-0.25,-5.2],
// 3 16 4.21 -0.25 -0.17 7 -0.25 -5.2 8 -0.25 -3.53
  [3,16,4.21,-0.25,-0.17,7,-0.25,-5.2,8,-0.25,-3.53],
// 4 16 8.84 -0.25 -3.74 8 -0.25 -3.53 7 -0.25 -5.2 8.8 -0.25 -5.9
  [4,16,8.84,-0.25,-3.74,8,-0.25,-3.53,7,-0.25,-5.2,8.8,-0.25,-5.9],
// 4 16 9.58 -0.25 -4.79 8.84 -0.25 -3.74 8.8 -0.25 -5.9 10.2 -0.25 -7.8
  [4,16,9.58,-0.25,-4.79,8.84,-0.25,-3.74,8.8,-0.25,-5.9,10.2,-0.25,-7.8],
// 4 16 9.58 -0.25 -4.79 10.2 -0.25 -7.8 10.9 -0.25 -7.6 11.26 -0.25 -4.9
  [4,16,9.58,-0.25,-4.79,10.2,-0.25,-7.8,10.9,-0.25,-7.6,11.26,-0.25,-4.9],
// 4 16 11.26 -0.25 -4.9 10.9 -0.25 -7.6 12.1 -0.25 -6.5 12.3 -0.25 -5.9
  [4,16,11.26,-0.25,-4.9,10.9,-0.25,-7.6,12.1,-0.25,-6.5,12.3,-0.25,-5.9],
];
makepoly(ldraw_lib__6005724h1(), line=0.2);
